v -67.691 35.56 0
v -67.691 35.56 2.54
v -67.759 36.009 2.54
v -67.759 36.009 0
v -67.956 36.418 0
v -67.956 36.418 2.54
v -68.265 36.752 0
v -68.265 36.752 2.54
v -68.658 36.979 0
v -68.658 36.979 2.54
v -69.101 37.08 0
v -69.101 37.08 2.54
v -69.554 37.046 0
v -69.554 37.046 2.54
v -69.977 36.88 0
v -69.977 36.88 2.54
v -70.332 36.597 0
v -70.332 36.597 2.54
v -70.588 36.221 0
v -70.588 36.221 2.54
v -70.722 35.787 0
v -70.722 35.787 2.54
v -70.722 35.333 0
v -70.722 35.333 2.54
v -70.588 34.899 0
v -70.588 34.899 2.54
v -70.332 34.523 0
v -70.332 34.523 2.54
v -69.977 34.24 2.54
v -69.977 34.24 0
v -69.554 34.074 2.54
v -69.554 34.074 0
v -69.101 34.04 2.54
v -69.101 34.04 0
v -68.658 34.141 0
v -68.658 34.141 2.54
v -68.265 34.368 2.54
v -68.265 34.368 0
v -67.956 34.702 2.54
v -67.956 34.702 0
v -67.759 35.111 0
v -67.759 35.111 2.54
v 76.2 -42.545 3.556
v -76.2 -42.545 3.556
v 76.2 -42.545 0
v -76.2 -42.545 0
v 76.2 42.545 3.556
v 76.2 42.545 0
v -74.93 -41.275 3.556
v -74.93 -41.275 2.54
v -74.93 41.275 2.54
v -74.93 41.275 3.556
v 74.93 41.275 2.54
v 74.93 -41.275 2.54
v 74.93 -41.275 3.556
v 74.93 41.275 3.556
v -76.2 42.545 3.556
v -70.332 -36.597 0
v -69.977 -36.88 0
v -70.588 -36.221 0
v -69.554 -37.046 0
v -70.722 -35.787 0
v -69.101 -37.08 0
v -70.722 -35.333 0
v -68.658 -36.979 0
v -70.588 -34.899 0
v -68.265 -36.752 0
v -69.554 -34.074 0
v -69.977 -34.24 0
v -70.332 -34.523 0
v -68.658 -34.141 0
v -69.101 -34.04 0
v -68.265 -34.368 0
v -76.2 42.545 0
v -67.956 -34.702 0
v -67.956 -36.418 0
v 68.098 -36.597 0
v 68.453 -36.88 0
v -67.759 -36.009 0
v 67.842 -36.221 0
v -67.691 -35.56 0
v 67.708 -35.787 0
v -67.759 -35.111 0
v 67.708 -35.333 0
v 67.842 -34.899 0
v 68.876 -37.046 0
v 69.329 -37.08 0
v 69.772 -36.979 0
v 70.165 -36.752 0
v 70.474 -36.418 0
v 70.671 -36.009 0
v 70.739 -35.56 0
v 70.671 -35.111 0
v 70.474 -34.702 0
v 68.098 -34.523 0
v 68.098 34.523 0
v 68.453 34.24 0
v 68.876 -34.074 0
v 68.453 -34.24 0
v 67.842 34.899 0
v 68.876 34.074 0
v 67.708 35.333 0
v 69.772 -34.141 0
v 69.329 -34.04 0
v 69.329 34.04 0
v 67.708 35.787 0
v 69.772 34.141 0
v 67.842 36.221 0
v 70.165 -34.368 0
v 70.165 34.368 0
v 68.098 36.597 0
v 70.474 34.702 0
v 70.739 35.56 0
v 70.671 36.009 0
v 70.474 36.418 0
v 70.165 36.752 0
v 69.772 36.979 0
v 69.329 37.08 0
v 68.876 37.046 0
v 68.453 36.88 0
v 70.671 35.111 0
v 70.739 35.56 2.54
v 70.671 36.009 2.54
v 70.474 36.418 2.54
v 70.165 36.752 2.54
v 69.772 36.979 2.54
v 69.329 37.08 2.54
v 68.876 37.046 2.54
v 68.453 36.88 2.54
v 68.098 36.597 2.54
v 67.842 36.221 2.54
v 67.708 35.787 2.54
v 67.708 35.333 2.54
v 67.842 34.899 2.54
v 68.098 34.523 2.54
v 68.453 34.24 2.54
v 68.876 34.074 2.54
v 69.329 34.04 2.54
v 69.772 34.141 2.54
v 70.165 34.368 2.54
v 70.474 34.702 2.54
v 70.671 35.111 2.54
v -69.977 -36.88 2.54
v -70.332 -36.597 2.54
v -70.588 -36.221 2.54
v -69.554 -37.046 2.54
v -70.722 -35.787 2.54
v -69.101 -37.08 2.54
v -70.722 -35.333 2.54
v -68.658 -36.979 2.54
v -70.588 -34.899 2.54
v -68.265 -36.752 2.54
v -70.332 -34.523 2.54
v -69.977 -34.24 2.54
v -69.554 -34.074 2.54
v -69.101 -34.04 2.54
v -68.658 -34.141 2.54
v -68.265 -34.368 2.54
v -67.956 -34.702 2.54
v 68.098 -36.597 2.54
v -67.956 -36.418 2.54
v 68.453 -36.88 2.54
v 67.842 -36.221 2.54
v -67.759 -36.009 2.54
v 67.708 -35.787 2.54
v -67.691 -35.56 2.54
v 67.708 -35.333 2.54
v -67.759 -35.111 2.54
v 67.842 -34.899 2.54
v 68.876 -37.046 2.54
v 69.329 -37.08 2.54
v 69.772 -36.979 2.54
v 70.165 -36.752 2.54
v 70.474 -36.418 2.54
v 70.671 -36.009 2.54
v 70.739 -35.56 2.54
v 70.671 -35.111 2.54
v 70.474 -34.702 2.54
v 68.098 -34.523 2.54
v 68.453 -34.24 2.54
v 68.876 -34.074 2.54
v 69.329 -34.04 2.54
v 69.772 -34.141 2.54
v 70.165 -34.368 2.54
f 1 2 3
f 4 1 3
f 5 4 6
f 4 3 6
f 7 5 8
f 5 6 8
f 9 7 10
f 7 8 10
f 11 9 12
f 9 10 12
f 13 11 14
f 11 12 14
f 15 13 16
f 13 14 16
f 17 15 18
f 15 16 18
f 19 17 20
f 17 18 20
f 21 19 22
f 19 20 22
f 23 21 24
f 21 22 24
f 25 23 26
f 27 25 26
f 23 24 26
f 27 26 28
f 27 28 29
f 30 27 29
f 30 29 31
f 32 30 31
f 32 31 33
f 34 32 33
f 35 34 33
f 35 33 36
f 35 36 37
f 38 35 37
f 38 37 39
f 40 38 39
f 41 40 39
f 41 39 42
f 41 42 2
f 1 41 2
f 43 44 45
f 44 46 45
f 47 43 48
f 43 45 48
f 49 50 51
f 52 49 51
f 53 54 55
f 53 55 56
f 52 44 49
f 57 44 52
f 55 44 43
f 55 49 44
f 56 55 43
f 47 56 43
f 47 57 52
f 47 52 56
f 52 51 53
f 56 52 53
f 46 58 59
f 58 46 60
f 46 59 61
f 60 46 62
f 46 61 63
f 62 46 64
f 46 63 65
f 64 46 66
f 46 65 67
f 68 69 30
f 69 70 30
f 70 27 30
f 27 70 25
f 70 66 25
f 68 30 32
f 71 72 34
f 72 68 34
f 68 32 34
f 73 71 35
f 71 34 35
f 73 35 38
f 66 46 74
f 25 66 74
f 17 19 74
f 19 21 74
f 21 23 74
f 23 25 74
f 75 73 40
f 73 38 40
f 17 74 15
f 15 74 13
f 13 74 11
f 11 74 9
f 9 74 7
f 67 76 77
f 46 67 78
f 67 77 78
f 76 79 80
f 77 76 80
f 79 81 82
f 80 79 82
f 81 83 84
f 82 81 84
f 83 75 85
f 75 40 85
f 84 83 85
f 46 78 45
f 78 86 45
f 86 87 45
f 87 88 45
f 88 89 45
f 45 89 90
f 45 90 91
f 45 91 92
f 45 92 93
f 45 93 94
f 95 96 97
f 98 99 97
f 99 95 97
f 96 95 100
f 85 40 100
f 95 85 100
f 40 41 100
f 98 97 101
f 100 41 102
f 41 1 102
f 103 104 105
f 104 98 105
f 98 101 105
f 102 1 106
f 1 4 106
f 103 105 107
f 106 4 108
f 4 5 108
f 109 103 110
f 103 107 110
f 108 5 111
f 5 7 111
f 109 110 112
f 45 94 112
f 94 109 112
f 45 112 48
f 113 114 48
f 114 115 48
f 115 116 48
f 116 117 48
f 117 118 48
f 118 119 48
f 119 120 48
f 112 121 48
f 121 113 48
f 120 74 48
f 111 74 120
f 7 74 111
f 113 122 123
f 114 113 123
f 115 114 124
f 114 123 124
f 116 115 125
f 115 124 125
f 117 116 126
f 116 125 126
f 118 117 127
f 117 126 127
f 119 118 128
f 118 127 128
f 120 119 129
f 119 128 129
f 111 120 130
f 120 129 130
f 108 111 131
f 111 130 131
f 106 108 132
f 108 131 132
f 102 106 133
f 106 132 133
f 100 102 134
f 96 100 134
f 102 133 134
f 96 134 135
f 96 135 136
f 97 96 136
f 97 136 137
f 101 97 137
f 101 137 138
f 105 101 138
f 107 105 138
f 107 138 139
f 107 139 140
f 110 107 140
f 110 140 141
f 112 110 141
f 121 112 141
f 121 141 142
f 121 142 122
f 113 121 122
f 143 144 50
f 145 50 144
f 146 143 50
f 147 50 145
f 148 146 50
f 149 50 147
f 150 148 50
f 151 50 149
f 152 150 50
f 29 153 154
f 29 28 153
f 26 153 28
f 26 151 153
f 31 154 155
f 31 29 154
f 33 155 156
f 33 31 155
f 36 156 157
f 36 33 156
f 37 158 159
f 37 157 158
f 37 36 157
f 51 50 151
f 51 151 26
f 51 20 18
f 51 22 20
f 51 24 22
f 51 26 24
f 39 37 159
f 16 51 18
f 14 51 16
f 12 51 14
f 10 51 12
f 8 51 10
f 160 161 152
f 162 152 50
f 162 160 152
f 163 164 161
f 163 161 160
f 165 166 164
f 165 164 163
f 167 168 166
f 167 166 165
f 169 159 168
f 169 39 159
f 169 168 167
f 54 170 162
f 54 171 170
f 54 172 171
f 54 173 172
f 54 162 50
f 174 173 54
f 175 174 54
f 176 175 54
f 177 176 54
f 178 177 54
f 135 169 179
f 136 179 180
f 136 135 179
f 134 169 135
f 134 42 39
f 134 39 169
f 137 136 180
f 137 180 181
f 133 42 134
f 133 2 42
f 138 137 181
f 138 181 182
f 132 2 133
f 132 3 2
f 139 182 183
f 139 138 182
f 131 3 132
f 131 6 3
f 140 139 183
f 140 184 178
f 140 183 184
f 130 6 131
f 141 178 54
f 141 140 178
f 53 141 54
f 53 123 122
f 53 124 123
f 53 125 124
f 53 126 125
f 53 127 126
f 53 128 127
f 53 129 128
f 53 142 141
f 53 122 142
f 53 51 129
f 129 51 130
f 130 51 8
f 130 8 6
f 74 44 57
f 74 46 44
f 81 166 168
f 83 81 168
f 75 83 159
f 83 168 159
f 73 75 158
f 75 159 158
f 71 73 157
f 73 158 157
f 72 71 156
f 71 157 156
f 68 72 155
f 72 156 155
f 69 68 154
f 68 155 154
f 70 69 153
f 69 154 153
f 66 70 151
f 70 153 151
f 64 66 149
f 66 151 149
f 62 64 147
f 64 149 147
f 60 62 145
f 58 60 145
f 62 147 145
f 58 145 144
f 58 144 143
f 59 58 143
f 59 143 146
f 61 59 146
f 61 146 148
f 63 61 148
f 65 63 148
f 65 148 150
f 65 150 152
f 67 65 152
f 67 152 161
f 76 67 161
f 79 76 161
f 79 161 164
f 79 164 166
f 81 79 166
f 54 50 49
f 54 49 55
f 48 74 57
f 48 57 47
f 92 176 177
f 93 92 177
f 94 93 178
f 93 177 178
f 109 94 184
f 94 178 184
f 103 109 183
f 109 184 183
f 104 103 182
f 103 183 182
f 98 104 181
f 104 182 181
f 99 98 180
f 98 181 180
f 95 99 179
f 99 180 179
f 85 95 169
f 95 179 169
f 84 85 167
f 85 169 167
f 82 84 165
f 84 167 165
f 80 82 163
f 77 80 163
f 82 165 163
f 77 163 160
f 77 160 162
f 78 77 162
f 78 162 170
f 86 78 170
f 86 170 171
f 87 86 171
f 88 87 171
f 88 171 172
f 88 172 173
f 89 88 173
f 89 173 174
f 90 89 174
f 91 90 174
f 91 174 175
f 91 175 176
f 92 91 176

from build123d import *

# Parameters (mm, degrees)
F0_W     = 152.4
F0_H     = 85.09
F1_DEPTH = 2.54
F2_W     = 152.4
F2_H     = 85.09
F2_W_2   = 149.86
F2_H_2   = 82.55
F3_DEPTH = 1.016
F4_R     = 1.524
F5_DEPTH = 25.4


with BuildPart() as f1:
    # F0 (on Top) → F1 (new body)
    with BuildSketch(Plane.XY):
        Rectangle(F0_W, F0_H)
    extrude(amount=F1_DEPTH)

    # F2 (on face) → F3 (join)
    with BuildSketch(Plane.XY.offset(2.54)):
        Rectangle(F2_W, F2_H)
        Rectangle(F2_W_2, F2_H_2, mode=Mode.SUBTRACT)
    extrude(amount=F3_DEPTH)

    # F4 (on face) → F5 (cut)
    with BuildSketch(Plane.XY.offset(2.54)):
        with Locations((69.215, 35.56)):
            Circle(F4_R)
        with Locations((69.215, -35.56)):
            Circle(F4_R)
        with Locations((-69.215, 35.56)):
            Circle(F4_R)
        with Locations((-69.215, -35.56)):
            Circle(F4_R)
    extrude(amount=-F5_DEPTH, mode=Mode.SUBTRACT)


solid = f1.part
